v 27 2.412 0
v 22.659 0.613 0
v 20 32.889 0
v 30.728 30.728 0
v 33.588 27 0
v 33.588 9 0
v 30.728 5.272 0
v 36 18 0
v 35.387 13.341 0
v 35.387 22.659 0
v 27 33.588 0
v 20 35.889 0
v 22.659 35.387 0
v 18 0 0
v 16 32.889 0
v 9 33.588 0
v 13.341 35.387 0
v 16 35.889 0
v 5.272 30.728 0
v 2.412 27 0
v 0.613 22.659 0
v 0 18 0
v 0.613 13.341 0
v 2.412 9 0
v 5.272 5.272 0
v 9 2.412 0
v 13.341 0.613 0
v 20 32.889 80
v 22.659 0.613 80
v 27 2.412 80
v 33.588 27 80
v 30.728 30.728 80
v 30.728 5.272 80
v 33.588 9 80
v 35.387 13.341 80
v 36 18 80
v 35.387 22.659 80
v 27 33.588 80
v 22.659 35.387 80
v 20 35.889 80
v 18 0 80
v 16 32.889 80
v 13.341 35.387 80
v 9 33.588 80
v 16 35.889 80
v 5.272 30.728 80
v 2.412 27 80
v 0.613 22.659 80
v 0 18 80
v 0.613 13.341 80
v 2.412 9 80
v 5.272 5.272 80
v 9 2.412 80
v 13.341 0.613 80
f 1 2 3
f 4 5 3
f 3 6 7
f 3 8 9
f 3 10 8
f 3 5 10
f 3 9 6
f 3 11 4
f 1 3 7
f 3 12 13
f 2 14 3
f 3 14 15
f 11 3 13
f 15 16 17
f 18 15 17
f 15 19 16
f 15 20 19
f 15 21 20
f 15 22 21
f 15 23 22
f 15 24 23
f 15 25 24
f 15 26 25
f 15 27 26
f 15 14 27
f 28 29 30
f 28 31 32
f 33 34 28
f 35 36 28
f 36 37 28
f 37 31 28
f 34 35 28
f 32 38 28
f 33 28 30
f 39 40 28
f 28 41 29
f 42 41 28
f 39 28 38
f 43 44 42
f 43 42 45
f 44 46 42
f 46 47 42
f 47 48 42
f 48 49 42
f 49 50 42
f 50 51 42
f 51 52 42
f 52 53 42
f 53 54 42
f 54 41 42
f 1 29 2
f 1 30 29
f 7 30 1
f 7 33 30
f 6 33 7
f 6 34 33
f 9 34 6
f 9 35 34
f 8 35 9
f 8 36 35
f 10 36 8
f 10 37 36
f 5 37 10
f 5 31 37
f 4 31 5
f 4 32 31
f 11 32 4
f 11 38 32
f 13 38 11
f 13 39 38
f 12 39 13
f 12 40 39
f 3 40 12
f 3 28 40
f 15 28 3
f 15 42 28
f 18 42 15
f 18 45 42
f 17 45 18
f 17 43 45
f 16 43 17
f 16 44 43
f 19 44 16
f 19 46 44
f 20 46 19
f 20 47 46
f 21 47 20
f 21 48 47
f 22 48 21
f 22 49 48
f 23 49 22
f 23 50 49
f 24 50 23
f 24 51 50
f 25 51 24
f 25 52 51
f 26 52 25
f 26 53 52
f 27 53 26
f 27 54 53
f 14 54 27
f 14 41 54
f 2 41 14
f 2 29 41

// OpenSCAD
$fn = 32;

// ----------------------------------------------------------------------
// Keyway shaft: d36 shaft, key 4 x 3 mm
// ----------------------------------------------------------------------

// --- parameters (mm) ---
shaft_r = 18;             // shaft radius
key_w = 4;                // keyway width
key_d = 3;                // keyway depth below the surface line
plate_t = 80;             // shaft length, Z (extrusion height)

shaft_d = 2 * shaft_r;  // shaft diameter
circle_step = 15;  // polygon sampling step, degrees

profile = [[13.341, 35.387], [9, 33.588], [5.272, 30.728], [2.412, 27], [0.613, 22.659], [0, 18], [0.613, 13.341], [2.412, 9], [5.272, 5.272], [9, 2.412], [13.341, 0.613], [18, 0], [22.659, 0.613], [27, 2.412], [30.728, 5.272], [33.588, 9], [35.387, 13.341], [36, 18], [35.387, 22.659], [33.588, 27], [30.728, 30.728], [27, 33.588], [22.659, 35.387], [20, 35.889], [20, 32.889], [16, 32.889], [16, 35.889]];  // primary outline, 27 points, counter clockwise

// --- the one profile operation ---
linear_extrude(height = plate_t) polygon(points = profile);
